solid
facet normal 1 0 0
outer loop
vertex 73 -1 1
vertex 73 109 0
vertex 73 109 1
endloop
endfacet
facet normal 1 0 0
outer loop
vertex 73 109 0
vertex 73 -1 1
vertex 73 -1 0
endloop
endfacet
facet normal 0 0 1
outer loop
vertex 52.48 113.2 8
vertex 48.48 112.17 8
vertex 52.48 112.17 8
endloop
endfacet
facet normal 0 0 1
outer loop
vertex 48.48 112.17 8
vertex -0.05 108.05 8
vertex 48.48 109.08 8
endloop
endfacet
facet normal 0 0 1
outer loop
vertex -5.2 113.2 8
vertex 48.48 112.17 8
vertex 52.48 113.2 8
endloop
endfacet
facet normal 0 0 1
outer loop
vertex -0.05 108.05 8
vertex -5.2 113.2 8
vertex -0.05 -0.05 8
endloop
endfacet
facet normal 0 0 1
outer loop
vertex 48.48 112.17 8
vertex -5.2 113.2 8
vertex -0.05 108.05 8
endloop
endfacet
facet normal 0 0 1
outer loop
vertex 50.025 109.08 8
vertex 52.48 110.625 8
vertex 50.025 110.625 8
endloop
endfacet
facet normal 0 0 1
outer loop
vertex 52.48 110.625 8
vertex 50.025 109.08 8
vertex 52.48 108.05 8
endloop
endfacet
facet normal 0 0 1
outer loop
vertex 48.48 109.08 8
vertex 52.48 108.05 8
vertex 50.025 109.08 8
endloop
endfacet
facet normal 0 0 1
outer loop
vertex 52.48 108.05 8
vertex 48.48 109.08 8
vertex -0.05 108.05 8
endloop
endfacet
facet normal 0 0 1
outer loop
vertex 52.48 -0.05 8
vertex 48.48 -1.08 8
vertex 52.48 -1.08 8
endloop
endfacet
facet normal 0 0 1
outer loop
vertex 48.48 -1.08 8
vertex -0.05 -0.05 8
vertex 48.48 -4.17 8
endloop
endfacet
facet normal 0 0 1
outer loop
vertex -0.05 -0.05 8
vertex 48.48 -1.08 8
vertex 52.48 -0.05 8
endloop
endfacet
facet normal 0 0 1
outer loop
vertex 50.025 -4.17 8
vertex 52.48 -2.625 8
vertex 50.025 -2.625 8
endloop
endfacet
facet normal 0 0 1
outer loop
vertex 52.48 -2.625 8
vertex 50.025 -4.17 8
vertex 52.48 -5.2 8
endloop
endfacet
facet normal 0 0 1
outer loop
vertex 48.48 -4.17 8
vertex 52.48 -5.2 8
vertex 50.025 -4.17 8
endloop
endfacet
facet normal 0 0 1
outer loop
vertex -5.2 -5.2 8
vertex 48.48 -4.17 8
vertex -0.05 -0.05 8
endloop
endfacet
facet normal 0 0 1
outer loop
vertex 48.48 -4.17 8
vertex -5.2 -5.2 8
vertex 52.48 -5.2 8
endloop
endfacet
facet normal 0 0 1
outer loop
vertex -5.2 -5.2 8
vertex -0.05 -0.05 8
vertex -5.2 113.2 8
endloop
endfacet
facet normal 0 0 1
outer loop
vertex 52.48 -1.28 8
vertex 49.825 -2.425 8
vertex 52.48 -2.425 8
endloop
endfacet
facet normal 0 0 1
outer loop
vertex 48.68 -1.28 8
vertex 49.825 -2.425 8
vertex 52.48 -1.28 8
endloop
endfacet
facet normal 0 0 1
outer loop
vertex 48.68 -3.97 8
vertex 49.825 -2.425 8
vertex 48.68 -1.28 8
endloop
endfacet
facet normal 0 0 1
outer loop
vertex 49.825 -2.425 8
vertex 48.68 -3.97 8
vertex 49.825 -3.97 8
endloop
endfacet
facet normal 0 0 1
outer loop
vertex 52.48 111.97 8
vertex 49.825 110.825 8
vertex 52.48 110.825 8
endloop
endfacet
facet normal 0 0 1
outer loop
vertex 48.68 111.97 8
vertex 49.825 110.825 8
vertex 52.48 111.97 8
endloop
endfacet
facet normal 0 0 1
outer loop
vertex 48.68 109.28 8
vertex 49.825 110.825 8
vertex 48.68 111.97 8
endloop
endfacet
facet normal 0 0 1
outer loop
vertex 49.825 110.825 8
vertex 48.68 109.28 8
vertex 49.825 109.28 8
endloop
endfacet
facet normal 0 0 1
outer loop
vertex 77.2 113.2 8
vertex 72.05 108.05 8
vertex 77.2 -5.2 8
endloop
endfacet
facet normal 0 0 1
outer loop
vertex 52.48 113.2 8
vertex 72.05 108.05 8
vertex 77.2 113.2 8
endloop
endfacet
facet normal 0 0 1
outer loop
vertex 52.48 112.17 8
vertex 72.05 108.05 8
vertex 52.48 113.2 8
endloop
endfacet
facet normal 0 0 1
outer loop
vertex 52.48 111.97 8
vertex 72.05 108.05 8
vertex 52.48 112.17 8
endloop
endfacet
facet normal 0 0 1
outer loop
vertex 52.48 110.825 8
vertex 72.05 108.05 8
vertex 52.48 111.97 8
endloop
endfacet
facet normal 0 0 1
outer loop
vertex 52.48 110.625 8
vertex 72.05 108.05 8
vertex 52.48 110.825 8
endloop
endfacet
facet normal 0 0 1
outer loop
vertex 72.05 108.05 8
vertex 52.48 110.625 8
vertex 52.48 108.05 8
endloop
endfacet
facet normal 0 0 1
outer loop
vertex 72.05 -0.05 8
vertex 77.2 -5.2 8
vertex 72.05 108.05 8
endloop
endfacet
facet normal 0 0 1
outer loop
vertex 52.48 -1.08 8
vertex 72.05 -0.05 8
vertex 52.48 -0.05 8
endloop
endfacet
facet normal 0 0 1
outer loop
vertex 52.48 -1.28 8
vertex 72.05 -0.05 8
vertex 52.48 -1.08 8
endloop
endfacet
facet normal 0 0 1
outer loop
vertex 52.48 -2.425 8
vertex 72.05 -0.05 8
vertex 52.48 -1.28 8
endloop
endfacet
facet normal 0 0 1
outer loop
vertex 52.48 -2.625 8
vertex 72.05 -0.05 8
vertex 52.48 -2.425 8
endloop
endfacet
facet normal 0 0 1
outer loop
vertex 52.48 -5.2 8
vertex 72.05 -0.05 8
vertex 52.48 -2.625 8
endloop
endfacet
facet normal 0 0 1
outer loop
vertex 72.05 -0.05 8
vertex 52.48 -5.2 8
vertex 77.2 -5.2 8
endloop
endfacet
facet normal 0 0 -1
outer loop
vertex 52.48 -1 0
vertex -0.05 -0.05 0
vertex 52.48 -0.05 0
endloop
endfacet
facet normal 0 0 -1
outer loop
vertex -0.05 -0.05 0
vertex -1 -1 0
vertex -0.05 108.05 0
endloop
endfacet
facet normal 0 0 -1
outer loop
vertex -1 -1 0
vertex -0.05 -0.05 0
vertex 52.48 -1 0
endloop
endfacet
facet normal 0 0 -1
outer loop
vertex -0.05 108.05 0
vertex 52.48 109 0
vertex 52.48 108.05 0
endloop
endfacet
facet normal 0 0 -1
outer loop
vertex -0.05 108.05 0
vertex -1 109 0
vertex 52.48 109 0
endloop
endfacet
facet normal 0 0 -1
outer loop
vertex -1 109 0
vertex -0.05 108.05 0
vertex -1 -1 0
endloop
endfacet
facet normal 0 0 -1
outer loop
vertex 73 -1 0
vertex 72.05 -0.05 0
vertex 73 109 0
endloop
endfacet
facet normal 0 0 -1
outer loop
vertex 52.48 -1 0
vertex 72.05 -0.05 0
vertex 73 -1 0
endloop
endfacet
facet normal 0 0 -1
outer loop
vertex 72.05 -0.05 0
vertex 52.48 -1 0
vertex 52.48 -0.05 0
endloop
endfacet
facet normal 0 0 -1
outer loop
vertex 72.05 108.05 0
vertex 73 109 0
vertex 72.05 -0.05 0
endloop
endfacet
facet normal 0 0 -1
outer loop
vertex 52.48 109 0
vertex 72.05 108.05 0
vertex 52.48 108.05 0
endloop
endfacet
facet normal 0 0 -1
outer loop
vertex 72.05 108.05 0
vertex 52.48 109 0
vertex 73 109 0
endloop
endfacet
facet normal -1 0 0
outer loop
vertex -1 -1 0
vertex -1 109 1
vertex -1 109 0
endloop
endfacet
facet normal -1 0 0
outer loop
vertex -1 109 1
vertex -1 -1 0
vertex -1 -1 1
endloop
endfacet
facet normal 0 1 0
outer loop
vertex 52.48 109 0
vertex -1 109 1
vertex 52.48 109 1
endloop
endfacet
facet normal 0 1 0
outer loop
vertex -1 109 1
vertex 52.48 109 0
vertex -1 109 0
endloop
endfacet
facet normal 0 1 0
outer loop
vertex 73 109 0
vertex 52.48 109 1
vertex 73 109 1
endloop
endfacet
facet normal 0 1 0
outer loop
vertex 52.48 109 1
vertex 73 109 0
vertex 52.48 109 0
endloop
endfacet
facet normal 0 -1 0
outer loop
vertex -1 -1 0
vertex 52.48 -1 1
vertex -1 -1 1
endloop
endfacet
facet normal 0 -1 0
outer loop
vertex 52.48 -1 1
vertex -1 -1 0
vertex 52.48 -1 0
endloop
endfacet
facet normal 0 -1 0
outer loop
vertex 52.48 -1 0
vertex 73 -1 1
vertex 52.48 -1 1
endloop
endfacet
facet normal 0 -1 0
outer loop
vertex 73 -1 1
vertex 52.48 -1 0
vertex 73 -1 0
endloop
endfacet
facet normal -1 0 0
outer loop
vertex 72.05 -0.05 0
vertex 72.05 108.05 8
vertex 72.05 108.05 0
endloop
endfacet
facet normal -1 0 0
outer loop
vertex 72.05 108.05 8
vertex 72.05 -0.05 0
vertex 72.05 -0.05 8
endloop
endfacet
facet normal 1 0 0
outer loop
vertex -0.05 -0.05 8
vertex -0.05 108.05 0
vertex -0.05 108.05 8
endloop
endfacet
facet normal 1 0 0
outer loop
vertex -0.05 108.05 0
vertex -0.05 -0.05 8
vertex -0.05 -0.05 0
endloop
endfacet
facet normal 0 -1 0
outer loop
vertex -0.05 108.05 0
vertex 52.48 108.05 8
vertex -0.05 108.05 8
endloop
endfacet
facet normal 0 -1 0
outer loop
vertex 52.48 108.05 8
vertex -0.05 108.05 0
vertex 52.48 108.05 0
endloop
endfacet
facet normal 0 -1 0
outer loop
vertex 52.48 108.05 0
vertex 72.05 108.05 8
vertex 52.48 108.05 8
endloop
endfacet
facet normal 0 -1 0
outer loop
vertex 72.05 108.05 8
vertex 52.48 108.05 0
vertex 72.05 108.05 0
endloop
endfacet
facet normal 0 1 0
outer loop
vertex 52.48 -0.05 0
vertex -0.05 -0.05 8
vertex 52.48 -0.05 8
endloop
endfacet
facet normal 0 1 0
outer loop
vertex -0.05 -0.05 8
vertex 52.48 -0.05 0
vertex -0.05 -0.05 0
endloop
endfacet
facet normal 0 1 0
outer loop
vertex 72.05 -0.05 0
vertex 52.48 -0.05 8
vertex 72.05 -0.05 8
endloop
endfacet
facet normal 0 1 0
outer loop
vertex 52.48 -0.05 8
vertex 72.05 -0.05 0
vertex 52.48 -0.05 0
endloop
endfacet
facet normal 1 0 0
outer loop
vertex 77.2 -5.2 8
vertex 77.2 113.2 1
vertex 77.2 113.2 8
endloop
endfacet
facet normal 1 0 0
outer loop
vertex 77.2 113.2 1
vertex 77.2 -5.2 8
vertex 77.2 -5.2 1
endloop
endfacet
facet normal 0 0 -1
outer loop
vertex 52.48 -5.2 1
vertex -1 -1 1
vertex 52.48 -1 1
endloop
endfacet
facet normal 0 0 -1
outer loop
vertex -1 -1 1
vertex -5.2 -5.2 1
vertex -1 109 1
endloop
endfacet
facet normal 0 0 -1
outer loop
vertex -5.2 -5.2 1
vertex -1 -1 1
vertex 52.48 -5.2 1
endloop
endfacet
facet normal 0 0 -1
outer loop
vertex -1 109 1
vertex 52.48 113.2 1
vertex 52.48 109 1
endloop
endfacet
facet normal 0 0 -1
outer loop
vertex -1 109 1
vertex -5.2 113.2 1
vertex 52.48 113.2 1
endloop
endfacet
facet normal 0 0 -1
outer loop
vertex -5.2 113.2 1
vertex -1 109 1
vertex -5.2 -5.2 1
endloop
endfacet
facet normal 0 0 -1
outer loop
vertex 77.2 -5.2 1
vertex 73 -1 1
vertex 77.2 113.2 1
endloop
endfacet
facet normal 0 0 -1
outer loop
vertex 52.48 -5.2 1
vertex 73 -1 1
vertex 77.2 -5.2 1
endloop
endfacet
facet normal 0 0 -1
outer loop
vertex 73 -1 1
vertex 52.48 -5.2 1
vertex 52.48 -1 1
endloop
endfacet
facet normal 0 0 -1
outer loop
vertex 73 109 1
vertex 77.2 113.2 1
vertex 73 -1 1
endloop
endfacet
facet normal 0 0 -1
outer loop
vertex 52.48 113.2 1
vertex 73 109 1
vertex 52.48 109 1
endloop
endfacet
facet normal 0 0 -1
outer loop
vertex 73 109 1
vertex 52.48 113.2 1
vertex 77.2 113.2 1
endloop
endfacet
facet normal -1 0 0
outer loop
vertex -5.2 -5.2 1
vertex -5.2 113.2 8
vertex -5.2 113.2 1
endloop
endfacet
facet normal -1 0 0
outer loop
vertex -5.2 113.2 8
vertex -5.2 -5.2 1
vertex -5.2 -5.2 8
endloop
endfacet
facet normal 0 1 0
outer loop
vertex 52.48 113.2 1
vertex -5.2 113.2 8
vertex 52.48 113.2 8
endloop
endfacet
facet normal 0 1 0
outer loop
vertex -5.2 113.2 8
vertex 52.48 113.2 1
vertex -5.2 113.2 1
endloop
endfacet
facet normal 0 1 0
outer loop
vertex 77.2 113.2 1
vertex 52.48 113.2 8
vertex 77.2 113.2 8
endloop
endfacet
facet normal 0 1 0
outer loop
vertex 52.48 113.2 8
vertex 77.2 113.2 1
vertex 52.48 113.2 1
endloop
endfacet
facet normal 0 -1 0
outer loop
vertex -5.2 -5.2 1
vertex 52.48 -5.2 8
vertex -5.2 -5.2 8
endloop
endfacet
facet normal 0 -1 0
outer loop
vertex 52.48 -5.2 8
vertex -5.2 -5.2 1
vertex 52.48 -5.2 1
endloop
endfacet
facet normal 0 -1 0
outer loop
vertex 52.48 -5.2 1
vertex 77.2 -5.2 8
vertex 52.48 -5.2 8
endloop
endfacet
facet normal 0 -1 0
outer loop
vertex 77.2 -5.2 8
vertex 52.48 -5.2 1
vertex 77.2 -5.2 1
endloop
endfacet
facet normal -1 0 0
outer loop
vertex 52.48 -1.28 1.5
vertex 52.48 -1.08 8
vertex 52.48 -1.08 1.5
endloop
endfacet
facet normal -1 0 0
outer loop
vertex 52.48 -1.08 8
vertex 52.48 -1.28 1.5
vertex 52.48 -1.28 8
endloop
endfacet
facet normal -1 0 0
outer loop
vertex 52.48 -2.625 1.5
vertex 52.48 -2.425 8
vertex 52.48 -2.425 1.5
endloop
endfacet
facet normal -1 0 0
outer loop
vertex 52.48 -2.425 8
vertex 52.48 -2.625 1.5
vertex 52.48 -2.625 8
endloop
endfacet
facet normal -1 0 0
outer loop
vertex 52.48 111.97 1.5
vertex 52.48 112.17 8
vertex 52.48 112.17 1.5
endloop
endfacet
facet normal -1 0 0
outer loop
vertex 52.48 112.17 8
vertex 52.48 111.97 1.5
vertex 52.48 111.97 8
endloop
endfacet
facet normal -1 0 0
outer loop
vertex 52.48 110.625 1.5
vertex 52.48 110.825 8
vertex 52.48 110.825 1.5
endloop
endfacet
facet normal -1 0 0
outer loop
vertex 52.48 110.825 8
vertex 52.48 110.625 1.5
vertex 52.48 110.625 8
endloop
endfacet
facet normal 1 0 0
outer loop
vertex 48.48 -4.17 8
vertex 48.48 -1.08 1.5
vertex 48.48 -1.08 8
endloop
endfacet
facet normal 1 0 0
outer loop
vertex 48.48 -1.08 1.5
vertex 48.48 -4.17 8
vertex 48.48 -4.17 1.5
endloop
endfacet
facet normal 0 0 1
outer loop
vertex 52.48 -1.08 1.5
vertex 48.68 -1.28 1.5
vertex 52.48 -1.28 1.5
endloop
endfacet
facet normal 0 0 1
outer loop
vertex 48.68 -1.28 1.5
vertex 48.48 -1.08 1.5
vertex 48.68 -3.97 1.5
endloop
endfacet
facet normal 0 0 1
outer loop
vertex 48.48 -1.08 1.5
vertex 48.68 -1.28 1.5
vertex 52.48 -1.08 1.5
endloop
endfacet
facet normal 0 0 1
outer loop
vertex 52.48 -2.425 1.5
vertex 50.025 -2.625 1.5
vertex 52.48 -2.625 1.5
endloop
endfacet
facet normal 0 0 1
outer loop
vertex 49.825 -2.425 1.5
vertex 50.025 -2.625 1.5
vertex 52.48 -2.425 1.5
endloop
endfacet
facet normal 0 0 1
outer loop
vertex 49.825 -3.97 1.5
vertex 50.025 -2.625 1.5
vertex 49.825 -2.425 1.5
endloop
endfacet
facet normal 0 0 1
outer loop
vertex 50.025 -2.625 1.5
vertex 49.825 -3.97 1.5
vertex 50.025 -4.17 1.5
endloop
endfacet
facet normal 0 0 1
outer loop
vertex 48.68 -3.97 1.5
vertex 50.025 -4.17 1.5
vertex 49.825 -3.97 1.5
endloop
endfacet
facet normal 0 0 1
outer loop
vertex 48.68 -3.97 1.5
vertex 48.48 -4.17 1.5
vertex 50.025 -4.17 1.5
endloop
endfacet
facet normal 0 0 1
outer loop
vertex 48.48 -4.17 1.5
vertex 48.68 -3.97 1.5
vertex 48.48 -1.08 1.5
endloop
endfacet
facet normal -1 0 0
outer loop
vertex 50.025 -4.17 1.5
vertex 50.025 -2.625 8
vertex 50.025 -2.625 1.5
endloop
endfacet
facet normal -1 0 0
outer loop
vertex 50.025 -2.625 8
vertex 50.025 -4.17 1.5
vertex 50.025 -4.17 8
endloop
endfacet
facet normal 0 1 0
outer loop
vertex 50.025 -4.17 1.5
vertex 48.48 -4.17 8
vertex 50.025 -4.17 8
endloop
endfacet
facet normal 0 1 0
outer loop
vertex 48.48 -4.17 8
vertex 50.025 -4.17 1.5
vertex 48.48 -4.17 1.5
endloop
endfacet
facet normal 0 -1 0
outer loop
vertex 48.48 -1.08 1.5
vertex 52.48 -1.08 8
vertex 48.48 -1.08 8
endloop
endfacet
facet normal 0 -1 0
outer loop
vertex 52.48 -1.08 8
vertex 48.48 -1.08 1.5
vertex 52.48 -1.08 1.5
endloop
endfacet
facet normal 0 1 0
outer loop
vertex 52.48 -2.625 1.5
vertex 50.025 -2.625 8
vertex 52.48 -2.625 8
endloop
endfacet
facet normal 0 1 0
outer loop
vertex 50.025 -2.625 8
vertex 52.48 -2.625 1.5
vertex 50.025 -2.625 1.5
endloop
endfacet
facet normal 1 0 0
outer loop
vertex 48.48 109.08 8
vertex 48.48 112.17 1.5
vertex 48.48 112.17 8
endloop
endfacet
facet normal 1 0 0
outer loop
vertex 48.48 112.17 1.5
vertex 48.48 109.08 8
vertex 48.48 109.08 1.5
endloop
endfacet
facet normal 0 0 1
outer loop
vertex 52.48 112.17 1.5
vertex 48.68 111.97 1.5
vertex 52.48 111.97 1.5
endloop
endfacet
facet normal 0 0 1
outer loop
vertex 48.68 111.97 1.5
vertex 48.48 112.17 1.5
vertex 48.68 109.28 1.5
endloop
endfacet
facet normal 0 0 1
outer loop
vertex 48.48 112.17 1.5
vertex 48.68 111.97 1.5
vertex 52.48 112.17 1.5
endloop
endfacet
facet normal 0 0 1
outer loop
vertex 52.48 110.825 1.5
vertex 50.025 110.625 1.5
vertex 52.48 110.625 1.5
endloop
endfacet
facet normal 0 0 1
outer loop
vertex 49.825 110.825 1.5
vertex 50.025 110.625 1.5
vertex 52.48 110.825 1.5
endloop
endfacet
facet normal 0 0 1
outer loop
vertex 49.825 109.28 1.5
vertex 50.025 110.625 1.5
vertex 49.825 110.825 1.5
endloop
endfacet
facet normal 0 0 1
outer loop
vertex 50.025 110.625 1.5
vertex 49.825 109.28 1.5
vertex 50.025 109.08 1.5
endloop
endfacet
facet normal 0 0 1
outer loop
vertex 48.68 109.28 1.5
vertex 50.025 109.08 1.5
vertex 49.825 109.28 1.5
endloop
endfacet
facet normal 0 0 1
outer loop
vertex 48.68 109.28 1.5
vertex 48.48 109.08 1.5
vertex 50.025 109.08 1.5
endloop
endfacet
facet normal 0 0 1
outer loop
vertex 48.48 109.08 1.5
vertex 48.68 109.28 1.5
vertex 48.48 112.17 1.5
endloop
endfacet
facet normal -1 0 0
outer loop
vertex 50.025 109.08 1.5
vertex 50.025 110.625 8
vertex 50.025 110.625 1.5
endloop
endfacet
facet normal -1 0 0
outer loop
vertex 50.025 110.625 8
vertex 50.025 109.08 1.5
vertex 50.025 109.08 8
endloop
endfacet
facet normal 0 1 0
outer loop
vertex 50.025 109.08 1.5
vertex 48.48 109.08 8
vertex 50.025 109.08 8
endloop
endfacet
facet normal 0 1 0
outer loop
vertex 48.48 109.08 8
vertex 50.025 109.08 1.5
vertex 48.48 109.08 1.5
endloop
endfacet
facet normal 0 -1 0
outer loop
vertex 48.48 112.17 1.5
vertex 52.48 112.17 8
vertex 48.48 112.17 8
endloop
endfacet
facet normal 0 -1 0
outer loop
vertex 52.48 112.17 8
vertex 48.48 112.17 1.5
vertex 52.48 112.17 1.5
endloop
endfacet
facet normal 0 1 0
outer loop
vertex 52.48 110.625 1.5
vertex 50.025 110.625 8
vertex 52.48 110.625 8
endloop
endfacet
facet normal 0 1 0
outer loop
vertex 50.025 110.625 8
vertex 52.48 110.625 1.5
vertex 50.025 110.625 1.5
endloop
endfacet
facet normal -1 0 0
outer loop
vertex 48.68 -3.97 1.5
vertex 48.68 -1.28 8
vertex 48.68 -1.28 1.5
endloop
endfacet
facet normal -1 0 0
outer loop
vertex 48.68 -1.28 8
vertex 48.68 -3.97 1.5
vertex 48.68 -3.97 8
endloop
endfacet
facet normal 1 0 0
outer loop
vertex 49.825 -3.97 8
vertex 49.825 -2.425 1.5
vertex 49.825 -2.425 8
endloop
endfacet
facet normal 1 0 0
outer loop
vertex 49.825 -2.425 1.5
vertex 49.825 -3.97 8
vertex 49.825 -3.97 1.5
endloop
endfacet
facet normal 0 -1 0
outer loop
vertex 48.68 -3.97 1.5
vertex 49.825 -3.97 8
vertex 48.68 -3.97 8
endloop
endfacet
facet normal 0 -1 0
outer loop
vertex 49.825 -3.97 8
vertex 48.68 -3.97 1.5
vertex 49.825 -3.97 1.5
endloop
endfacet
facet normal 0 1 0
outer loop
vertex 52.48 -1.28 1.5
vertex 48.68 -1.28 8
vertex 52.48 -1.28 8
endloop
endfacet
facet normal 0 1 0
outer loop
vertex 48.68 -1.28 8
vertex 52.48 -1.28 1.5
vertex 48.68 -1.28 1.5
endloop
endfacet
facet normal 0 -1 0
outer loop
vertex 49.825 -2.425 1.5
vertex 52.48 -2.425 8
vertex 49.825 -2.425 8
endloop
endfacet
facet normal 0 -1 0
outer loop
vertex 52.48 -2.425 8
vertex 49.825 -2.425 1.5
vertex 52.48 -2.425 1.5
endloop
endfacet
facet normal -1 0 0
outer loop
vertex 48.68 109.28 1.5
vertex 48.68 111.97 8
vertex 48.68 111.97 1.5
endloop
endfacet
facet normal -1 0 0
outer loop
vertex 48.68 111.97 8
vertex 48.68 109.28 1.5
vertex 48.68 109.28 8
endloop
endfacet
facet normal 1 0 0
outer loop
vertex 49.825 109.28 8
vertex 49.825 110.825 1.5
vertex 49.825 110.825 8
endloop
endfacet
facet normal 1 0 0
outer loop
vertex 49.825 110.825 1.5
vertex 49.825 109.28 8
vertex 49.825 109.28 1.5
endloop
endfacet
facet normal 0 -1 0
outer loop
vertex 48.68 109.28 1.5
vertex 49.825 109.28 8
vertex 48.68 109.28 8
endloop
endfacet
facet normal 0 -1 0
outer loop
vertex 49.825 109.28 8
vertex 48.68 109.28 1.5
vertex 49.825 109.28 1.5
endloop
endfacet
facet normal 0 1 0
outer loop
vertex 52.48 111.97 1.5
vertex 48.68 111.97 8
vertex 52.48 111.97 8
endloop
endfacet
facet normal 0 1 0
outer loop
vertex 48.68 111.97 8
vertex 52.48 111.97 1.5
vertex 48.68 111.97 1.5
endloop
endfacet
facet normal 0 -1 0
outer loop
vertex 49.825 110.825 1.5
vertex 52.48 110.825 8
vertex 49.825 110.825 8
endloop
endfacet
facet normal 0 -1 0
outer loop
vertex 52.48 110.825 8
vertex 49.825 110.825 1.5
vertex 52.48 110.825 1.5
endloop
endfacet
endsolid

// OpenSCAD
// Generated by SolidPython 1.0.4 on 2021-07-12 16:52:28


union() {
	difference() {
		difference() {
			difference() {
				union() {
					difference() {
						translate(v = [-1.0000000000, -1.0000000000, 0]) {
							cube(size = [74.0000000000, 110.0000000000, 8]);
						}
						translate(v = [-0.0500000000, -0.0500000000, 0]) {
							cube(size = [72.1000000000, 108.1000000000, 8]);
						}
					}
					translate(v = [0, 0, 1]) {
						difference() {
							translate(v = [-5.2000000000, -5.2000000000, 0]) {
								cube(size = [82.4000000000, 118.4000000000, 7]);
							}
							translate(v = [-1.0000000000, -1.0000000000, 0]) {
								cube(size = [74.0000000000, 110.0000000000, 7]);
							}
						}
					}
				}
				translate(v = [52.4800000000, -5.2000000000, 0]) {
					cube(size = [24.7200000000, 118.4000000000, 8]);
				}
			}
			translate(v = [48.4800000000, -4.1700000000, 0]) {
				translate(v = [0, 0, 1.5000000000]) {
					translate(v = [4, 3.0900000000, 0]) {
						rotate(a = -180) {
							union() {
								translate(v = [2.4550000000, 0, 0]) {
									cube(size = [1.5450000000, 3.0900000000, 6.5000000000]);
								}
								cube(size = [4, 1.5450000000, 6.5000000000]);
							}
						}
					}
				}
			}
		}
		translate(v = [48.4800000000, 109.0800000000, 0]) {
			translate(v = [0, 0, 1.5000000000]) {
				translate(v = [4, 3.0900000000, 0]) {
					rotate(a = -180) {
						union() {
							translate(v = [2.4550000000, 0, 0]) {
								cube(size = [1.5450000000, 3.0900000000, 6.5000000000]);
							}
							cube(size = [4, 1.5450000000, 6.5000000000]);
						}
					}
				}
			}
		}
	}
	union() {
		union() {
			difference() {
				union() {
					difference() {
						translate(v = [-1.0000000000, -1.0000000000, 0]) {
							cube(size = [74.0000000000, 110.0000000000, 8]);
						}
						translate(v = [-0.0500000000, -0.0500000000, 0]) {
							cube(size = [72.1000000000, 108.1000000000, 8]);
						}
					}
					translate(v = [0, 0, 1]) {
						difference() {
							translate(v = [-5.2000000000, -5.2000000000, 0]) {
								cube(size = [82.4000000000, 118.4000000000, 7]);
							}
							translate(v = [-1.0000000000, -1.0000000000, 0]) {
								cube(size = [74.0000000000, 110.0000000000, 7]);
							}
						}
					}
				}
				translate(v = [-5.2000000000, -5.2000000000, 0]) {
					cube(size = [57.6800000000, 118.4000000000, 8]);
				}
			}
			translate(v = [48.4800000000, -4.1700000000, 0]) {
				translate(v = [0.2000000000, 0.2000000000, 0]) {
					translate(v = [0, 0, 1.5000000000]) {
						translate(v = [3.8000000000, 2.6900000000, 0]) {
							rotate(a = -180) {
								union() {
									translate(v = [2.6550000000, 0, 0]) {
										cube(size = [1.1450000000, 2.6900000000, 6.5000000000]);
									}
									cube(size = [3.8000000000, 1.1450000000, 6.5000000000]);
								}
							}
						}
					}
				}
			}
		}
		translate(v = [48.4800000000, 109.0800000000, 0]) {
			translate(v = [0.2000000000, 0.2000000000, 0]) {
				translate(v = [0, 0, 1.5000000000]) {
					translate(v = [3.8000000000, 2.6900000000, 0]) {
						rotate(a = -180) {
							union() {
								translate(v = [2.6550000000, 0, 0]) {
									cube(size = [1.1450000000, 2.6900000000, 6.5000000000]);
								}
								cube(size = [3.8000000000, 1.1450000000, 6.5000000000]);
							}
						}
					}
				}
			}
		}
	}
}
